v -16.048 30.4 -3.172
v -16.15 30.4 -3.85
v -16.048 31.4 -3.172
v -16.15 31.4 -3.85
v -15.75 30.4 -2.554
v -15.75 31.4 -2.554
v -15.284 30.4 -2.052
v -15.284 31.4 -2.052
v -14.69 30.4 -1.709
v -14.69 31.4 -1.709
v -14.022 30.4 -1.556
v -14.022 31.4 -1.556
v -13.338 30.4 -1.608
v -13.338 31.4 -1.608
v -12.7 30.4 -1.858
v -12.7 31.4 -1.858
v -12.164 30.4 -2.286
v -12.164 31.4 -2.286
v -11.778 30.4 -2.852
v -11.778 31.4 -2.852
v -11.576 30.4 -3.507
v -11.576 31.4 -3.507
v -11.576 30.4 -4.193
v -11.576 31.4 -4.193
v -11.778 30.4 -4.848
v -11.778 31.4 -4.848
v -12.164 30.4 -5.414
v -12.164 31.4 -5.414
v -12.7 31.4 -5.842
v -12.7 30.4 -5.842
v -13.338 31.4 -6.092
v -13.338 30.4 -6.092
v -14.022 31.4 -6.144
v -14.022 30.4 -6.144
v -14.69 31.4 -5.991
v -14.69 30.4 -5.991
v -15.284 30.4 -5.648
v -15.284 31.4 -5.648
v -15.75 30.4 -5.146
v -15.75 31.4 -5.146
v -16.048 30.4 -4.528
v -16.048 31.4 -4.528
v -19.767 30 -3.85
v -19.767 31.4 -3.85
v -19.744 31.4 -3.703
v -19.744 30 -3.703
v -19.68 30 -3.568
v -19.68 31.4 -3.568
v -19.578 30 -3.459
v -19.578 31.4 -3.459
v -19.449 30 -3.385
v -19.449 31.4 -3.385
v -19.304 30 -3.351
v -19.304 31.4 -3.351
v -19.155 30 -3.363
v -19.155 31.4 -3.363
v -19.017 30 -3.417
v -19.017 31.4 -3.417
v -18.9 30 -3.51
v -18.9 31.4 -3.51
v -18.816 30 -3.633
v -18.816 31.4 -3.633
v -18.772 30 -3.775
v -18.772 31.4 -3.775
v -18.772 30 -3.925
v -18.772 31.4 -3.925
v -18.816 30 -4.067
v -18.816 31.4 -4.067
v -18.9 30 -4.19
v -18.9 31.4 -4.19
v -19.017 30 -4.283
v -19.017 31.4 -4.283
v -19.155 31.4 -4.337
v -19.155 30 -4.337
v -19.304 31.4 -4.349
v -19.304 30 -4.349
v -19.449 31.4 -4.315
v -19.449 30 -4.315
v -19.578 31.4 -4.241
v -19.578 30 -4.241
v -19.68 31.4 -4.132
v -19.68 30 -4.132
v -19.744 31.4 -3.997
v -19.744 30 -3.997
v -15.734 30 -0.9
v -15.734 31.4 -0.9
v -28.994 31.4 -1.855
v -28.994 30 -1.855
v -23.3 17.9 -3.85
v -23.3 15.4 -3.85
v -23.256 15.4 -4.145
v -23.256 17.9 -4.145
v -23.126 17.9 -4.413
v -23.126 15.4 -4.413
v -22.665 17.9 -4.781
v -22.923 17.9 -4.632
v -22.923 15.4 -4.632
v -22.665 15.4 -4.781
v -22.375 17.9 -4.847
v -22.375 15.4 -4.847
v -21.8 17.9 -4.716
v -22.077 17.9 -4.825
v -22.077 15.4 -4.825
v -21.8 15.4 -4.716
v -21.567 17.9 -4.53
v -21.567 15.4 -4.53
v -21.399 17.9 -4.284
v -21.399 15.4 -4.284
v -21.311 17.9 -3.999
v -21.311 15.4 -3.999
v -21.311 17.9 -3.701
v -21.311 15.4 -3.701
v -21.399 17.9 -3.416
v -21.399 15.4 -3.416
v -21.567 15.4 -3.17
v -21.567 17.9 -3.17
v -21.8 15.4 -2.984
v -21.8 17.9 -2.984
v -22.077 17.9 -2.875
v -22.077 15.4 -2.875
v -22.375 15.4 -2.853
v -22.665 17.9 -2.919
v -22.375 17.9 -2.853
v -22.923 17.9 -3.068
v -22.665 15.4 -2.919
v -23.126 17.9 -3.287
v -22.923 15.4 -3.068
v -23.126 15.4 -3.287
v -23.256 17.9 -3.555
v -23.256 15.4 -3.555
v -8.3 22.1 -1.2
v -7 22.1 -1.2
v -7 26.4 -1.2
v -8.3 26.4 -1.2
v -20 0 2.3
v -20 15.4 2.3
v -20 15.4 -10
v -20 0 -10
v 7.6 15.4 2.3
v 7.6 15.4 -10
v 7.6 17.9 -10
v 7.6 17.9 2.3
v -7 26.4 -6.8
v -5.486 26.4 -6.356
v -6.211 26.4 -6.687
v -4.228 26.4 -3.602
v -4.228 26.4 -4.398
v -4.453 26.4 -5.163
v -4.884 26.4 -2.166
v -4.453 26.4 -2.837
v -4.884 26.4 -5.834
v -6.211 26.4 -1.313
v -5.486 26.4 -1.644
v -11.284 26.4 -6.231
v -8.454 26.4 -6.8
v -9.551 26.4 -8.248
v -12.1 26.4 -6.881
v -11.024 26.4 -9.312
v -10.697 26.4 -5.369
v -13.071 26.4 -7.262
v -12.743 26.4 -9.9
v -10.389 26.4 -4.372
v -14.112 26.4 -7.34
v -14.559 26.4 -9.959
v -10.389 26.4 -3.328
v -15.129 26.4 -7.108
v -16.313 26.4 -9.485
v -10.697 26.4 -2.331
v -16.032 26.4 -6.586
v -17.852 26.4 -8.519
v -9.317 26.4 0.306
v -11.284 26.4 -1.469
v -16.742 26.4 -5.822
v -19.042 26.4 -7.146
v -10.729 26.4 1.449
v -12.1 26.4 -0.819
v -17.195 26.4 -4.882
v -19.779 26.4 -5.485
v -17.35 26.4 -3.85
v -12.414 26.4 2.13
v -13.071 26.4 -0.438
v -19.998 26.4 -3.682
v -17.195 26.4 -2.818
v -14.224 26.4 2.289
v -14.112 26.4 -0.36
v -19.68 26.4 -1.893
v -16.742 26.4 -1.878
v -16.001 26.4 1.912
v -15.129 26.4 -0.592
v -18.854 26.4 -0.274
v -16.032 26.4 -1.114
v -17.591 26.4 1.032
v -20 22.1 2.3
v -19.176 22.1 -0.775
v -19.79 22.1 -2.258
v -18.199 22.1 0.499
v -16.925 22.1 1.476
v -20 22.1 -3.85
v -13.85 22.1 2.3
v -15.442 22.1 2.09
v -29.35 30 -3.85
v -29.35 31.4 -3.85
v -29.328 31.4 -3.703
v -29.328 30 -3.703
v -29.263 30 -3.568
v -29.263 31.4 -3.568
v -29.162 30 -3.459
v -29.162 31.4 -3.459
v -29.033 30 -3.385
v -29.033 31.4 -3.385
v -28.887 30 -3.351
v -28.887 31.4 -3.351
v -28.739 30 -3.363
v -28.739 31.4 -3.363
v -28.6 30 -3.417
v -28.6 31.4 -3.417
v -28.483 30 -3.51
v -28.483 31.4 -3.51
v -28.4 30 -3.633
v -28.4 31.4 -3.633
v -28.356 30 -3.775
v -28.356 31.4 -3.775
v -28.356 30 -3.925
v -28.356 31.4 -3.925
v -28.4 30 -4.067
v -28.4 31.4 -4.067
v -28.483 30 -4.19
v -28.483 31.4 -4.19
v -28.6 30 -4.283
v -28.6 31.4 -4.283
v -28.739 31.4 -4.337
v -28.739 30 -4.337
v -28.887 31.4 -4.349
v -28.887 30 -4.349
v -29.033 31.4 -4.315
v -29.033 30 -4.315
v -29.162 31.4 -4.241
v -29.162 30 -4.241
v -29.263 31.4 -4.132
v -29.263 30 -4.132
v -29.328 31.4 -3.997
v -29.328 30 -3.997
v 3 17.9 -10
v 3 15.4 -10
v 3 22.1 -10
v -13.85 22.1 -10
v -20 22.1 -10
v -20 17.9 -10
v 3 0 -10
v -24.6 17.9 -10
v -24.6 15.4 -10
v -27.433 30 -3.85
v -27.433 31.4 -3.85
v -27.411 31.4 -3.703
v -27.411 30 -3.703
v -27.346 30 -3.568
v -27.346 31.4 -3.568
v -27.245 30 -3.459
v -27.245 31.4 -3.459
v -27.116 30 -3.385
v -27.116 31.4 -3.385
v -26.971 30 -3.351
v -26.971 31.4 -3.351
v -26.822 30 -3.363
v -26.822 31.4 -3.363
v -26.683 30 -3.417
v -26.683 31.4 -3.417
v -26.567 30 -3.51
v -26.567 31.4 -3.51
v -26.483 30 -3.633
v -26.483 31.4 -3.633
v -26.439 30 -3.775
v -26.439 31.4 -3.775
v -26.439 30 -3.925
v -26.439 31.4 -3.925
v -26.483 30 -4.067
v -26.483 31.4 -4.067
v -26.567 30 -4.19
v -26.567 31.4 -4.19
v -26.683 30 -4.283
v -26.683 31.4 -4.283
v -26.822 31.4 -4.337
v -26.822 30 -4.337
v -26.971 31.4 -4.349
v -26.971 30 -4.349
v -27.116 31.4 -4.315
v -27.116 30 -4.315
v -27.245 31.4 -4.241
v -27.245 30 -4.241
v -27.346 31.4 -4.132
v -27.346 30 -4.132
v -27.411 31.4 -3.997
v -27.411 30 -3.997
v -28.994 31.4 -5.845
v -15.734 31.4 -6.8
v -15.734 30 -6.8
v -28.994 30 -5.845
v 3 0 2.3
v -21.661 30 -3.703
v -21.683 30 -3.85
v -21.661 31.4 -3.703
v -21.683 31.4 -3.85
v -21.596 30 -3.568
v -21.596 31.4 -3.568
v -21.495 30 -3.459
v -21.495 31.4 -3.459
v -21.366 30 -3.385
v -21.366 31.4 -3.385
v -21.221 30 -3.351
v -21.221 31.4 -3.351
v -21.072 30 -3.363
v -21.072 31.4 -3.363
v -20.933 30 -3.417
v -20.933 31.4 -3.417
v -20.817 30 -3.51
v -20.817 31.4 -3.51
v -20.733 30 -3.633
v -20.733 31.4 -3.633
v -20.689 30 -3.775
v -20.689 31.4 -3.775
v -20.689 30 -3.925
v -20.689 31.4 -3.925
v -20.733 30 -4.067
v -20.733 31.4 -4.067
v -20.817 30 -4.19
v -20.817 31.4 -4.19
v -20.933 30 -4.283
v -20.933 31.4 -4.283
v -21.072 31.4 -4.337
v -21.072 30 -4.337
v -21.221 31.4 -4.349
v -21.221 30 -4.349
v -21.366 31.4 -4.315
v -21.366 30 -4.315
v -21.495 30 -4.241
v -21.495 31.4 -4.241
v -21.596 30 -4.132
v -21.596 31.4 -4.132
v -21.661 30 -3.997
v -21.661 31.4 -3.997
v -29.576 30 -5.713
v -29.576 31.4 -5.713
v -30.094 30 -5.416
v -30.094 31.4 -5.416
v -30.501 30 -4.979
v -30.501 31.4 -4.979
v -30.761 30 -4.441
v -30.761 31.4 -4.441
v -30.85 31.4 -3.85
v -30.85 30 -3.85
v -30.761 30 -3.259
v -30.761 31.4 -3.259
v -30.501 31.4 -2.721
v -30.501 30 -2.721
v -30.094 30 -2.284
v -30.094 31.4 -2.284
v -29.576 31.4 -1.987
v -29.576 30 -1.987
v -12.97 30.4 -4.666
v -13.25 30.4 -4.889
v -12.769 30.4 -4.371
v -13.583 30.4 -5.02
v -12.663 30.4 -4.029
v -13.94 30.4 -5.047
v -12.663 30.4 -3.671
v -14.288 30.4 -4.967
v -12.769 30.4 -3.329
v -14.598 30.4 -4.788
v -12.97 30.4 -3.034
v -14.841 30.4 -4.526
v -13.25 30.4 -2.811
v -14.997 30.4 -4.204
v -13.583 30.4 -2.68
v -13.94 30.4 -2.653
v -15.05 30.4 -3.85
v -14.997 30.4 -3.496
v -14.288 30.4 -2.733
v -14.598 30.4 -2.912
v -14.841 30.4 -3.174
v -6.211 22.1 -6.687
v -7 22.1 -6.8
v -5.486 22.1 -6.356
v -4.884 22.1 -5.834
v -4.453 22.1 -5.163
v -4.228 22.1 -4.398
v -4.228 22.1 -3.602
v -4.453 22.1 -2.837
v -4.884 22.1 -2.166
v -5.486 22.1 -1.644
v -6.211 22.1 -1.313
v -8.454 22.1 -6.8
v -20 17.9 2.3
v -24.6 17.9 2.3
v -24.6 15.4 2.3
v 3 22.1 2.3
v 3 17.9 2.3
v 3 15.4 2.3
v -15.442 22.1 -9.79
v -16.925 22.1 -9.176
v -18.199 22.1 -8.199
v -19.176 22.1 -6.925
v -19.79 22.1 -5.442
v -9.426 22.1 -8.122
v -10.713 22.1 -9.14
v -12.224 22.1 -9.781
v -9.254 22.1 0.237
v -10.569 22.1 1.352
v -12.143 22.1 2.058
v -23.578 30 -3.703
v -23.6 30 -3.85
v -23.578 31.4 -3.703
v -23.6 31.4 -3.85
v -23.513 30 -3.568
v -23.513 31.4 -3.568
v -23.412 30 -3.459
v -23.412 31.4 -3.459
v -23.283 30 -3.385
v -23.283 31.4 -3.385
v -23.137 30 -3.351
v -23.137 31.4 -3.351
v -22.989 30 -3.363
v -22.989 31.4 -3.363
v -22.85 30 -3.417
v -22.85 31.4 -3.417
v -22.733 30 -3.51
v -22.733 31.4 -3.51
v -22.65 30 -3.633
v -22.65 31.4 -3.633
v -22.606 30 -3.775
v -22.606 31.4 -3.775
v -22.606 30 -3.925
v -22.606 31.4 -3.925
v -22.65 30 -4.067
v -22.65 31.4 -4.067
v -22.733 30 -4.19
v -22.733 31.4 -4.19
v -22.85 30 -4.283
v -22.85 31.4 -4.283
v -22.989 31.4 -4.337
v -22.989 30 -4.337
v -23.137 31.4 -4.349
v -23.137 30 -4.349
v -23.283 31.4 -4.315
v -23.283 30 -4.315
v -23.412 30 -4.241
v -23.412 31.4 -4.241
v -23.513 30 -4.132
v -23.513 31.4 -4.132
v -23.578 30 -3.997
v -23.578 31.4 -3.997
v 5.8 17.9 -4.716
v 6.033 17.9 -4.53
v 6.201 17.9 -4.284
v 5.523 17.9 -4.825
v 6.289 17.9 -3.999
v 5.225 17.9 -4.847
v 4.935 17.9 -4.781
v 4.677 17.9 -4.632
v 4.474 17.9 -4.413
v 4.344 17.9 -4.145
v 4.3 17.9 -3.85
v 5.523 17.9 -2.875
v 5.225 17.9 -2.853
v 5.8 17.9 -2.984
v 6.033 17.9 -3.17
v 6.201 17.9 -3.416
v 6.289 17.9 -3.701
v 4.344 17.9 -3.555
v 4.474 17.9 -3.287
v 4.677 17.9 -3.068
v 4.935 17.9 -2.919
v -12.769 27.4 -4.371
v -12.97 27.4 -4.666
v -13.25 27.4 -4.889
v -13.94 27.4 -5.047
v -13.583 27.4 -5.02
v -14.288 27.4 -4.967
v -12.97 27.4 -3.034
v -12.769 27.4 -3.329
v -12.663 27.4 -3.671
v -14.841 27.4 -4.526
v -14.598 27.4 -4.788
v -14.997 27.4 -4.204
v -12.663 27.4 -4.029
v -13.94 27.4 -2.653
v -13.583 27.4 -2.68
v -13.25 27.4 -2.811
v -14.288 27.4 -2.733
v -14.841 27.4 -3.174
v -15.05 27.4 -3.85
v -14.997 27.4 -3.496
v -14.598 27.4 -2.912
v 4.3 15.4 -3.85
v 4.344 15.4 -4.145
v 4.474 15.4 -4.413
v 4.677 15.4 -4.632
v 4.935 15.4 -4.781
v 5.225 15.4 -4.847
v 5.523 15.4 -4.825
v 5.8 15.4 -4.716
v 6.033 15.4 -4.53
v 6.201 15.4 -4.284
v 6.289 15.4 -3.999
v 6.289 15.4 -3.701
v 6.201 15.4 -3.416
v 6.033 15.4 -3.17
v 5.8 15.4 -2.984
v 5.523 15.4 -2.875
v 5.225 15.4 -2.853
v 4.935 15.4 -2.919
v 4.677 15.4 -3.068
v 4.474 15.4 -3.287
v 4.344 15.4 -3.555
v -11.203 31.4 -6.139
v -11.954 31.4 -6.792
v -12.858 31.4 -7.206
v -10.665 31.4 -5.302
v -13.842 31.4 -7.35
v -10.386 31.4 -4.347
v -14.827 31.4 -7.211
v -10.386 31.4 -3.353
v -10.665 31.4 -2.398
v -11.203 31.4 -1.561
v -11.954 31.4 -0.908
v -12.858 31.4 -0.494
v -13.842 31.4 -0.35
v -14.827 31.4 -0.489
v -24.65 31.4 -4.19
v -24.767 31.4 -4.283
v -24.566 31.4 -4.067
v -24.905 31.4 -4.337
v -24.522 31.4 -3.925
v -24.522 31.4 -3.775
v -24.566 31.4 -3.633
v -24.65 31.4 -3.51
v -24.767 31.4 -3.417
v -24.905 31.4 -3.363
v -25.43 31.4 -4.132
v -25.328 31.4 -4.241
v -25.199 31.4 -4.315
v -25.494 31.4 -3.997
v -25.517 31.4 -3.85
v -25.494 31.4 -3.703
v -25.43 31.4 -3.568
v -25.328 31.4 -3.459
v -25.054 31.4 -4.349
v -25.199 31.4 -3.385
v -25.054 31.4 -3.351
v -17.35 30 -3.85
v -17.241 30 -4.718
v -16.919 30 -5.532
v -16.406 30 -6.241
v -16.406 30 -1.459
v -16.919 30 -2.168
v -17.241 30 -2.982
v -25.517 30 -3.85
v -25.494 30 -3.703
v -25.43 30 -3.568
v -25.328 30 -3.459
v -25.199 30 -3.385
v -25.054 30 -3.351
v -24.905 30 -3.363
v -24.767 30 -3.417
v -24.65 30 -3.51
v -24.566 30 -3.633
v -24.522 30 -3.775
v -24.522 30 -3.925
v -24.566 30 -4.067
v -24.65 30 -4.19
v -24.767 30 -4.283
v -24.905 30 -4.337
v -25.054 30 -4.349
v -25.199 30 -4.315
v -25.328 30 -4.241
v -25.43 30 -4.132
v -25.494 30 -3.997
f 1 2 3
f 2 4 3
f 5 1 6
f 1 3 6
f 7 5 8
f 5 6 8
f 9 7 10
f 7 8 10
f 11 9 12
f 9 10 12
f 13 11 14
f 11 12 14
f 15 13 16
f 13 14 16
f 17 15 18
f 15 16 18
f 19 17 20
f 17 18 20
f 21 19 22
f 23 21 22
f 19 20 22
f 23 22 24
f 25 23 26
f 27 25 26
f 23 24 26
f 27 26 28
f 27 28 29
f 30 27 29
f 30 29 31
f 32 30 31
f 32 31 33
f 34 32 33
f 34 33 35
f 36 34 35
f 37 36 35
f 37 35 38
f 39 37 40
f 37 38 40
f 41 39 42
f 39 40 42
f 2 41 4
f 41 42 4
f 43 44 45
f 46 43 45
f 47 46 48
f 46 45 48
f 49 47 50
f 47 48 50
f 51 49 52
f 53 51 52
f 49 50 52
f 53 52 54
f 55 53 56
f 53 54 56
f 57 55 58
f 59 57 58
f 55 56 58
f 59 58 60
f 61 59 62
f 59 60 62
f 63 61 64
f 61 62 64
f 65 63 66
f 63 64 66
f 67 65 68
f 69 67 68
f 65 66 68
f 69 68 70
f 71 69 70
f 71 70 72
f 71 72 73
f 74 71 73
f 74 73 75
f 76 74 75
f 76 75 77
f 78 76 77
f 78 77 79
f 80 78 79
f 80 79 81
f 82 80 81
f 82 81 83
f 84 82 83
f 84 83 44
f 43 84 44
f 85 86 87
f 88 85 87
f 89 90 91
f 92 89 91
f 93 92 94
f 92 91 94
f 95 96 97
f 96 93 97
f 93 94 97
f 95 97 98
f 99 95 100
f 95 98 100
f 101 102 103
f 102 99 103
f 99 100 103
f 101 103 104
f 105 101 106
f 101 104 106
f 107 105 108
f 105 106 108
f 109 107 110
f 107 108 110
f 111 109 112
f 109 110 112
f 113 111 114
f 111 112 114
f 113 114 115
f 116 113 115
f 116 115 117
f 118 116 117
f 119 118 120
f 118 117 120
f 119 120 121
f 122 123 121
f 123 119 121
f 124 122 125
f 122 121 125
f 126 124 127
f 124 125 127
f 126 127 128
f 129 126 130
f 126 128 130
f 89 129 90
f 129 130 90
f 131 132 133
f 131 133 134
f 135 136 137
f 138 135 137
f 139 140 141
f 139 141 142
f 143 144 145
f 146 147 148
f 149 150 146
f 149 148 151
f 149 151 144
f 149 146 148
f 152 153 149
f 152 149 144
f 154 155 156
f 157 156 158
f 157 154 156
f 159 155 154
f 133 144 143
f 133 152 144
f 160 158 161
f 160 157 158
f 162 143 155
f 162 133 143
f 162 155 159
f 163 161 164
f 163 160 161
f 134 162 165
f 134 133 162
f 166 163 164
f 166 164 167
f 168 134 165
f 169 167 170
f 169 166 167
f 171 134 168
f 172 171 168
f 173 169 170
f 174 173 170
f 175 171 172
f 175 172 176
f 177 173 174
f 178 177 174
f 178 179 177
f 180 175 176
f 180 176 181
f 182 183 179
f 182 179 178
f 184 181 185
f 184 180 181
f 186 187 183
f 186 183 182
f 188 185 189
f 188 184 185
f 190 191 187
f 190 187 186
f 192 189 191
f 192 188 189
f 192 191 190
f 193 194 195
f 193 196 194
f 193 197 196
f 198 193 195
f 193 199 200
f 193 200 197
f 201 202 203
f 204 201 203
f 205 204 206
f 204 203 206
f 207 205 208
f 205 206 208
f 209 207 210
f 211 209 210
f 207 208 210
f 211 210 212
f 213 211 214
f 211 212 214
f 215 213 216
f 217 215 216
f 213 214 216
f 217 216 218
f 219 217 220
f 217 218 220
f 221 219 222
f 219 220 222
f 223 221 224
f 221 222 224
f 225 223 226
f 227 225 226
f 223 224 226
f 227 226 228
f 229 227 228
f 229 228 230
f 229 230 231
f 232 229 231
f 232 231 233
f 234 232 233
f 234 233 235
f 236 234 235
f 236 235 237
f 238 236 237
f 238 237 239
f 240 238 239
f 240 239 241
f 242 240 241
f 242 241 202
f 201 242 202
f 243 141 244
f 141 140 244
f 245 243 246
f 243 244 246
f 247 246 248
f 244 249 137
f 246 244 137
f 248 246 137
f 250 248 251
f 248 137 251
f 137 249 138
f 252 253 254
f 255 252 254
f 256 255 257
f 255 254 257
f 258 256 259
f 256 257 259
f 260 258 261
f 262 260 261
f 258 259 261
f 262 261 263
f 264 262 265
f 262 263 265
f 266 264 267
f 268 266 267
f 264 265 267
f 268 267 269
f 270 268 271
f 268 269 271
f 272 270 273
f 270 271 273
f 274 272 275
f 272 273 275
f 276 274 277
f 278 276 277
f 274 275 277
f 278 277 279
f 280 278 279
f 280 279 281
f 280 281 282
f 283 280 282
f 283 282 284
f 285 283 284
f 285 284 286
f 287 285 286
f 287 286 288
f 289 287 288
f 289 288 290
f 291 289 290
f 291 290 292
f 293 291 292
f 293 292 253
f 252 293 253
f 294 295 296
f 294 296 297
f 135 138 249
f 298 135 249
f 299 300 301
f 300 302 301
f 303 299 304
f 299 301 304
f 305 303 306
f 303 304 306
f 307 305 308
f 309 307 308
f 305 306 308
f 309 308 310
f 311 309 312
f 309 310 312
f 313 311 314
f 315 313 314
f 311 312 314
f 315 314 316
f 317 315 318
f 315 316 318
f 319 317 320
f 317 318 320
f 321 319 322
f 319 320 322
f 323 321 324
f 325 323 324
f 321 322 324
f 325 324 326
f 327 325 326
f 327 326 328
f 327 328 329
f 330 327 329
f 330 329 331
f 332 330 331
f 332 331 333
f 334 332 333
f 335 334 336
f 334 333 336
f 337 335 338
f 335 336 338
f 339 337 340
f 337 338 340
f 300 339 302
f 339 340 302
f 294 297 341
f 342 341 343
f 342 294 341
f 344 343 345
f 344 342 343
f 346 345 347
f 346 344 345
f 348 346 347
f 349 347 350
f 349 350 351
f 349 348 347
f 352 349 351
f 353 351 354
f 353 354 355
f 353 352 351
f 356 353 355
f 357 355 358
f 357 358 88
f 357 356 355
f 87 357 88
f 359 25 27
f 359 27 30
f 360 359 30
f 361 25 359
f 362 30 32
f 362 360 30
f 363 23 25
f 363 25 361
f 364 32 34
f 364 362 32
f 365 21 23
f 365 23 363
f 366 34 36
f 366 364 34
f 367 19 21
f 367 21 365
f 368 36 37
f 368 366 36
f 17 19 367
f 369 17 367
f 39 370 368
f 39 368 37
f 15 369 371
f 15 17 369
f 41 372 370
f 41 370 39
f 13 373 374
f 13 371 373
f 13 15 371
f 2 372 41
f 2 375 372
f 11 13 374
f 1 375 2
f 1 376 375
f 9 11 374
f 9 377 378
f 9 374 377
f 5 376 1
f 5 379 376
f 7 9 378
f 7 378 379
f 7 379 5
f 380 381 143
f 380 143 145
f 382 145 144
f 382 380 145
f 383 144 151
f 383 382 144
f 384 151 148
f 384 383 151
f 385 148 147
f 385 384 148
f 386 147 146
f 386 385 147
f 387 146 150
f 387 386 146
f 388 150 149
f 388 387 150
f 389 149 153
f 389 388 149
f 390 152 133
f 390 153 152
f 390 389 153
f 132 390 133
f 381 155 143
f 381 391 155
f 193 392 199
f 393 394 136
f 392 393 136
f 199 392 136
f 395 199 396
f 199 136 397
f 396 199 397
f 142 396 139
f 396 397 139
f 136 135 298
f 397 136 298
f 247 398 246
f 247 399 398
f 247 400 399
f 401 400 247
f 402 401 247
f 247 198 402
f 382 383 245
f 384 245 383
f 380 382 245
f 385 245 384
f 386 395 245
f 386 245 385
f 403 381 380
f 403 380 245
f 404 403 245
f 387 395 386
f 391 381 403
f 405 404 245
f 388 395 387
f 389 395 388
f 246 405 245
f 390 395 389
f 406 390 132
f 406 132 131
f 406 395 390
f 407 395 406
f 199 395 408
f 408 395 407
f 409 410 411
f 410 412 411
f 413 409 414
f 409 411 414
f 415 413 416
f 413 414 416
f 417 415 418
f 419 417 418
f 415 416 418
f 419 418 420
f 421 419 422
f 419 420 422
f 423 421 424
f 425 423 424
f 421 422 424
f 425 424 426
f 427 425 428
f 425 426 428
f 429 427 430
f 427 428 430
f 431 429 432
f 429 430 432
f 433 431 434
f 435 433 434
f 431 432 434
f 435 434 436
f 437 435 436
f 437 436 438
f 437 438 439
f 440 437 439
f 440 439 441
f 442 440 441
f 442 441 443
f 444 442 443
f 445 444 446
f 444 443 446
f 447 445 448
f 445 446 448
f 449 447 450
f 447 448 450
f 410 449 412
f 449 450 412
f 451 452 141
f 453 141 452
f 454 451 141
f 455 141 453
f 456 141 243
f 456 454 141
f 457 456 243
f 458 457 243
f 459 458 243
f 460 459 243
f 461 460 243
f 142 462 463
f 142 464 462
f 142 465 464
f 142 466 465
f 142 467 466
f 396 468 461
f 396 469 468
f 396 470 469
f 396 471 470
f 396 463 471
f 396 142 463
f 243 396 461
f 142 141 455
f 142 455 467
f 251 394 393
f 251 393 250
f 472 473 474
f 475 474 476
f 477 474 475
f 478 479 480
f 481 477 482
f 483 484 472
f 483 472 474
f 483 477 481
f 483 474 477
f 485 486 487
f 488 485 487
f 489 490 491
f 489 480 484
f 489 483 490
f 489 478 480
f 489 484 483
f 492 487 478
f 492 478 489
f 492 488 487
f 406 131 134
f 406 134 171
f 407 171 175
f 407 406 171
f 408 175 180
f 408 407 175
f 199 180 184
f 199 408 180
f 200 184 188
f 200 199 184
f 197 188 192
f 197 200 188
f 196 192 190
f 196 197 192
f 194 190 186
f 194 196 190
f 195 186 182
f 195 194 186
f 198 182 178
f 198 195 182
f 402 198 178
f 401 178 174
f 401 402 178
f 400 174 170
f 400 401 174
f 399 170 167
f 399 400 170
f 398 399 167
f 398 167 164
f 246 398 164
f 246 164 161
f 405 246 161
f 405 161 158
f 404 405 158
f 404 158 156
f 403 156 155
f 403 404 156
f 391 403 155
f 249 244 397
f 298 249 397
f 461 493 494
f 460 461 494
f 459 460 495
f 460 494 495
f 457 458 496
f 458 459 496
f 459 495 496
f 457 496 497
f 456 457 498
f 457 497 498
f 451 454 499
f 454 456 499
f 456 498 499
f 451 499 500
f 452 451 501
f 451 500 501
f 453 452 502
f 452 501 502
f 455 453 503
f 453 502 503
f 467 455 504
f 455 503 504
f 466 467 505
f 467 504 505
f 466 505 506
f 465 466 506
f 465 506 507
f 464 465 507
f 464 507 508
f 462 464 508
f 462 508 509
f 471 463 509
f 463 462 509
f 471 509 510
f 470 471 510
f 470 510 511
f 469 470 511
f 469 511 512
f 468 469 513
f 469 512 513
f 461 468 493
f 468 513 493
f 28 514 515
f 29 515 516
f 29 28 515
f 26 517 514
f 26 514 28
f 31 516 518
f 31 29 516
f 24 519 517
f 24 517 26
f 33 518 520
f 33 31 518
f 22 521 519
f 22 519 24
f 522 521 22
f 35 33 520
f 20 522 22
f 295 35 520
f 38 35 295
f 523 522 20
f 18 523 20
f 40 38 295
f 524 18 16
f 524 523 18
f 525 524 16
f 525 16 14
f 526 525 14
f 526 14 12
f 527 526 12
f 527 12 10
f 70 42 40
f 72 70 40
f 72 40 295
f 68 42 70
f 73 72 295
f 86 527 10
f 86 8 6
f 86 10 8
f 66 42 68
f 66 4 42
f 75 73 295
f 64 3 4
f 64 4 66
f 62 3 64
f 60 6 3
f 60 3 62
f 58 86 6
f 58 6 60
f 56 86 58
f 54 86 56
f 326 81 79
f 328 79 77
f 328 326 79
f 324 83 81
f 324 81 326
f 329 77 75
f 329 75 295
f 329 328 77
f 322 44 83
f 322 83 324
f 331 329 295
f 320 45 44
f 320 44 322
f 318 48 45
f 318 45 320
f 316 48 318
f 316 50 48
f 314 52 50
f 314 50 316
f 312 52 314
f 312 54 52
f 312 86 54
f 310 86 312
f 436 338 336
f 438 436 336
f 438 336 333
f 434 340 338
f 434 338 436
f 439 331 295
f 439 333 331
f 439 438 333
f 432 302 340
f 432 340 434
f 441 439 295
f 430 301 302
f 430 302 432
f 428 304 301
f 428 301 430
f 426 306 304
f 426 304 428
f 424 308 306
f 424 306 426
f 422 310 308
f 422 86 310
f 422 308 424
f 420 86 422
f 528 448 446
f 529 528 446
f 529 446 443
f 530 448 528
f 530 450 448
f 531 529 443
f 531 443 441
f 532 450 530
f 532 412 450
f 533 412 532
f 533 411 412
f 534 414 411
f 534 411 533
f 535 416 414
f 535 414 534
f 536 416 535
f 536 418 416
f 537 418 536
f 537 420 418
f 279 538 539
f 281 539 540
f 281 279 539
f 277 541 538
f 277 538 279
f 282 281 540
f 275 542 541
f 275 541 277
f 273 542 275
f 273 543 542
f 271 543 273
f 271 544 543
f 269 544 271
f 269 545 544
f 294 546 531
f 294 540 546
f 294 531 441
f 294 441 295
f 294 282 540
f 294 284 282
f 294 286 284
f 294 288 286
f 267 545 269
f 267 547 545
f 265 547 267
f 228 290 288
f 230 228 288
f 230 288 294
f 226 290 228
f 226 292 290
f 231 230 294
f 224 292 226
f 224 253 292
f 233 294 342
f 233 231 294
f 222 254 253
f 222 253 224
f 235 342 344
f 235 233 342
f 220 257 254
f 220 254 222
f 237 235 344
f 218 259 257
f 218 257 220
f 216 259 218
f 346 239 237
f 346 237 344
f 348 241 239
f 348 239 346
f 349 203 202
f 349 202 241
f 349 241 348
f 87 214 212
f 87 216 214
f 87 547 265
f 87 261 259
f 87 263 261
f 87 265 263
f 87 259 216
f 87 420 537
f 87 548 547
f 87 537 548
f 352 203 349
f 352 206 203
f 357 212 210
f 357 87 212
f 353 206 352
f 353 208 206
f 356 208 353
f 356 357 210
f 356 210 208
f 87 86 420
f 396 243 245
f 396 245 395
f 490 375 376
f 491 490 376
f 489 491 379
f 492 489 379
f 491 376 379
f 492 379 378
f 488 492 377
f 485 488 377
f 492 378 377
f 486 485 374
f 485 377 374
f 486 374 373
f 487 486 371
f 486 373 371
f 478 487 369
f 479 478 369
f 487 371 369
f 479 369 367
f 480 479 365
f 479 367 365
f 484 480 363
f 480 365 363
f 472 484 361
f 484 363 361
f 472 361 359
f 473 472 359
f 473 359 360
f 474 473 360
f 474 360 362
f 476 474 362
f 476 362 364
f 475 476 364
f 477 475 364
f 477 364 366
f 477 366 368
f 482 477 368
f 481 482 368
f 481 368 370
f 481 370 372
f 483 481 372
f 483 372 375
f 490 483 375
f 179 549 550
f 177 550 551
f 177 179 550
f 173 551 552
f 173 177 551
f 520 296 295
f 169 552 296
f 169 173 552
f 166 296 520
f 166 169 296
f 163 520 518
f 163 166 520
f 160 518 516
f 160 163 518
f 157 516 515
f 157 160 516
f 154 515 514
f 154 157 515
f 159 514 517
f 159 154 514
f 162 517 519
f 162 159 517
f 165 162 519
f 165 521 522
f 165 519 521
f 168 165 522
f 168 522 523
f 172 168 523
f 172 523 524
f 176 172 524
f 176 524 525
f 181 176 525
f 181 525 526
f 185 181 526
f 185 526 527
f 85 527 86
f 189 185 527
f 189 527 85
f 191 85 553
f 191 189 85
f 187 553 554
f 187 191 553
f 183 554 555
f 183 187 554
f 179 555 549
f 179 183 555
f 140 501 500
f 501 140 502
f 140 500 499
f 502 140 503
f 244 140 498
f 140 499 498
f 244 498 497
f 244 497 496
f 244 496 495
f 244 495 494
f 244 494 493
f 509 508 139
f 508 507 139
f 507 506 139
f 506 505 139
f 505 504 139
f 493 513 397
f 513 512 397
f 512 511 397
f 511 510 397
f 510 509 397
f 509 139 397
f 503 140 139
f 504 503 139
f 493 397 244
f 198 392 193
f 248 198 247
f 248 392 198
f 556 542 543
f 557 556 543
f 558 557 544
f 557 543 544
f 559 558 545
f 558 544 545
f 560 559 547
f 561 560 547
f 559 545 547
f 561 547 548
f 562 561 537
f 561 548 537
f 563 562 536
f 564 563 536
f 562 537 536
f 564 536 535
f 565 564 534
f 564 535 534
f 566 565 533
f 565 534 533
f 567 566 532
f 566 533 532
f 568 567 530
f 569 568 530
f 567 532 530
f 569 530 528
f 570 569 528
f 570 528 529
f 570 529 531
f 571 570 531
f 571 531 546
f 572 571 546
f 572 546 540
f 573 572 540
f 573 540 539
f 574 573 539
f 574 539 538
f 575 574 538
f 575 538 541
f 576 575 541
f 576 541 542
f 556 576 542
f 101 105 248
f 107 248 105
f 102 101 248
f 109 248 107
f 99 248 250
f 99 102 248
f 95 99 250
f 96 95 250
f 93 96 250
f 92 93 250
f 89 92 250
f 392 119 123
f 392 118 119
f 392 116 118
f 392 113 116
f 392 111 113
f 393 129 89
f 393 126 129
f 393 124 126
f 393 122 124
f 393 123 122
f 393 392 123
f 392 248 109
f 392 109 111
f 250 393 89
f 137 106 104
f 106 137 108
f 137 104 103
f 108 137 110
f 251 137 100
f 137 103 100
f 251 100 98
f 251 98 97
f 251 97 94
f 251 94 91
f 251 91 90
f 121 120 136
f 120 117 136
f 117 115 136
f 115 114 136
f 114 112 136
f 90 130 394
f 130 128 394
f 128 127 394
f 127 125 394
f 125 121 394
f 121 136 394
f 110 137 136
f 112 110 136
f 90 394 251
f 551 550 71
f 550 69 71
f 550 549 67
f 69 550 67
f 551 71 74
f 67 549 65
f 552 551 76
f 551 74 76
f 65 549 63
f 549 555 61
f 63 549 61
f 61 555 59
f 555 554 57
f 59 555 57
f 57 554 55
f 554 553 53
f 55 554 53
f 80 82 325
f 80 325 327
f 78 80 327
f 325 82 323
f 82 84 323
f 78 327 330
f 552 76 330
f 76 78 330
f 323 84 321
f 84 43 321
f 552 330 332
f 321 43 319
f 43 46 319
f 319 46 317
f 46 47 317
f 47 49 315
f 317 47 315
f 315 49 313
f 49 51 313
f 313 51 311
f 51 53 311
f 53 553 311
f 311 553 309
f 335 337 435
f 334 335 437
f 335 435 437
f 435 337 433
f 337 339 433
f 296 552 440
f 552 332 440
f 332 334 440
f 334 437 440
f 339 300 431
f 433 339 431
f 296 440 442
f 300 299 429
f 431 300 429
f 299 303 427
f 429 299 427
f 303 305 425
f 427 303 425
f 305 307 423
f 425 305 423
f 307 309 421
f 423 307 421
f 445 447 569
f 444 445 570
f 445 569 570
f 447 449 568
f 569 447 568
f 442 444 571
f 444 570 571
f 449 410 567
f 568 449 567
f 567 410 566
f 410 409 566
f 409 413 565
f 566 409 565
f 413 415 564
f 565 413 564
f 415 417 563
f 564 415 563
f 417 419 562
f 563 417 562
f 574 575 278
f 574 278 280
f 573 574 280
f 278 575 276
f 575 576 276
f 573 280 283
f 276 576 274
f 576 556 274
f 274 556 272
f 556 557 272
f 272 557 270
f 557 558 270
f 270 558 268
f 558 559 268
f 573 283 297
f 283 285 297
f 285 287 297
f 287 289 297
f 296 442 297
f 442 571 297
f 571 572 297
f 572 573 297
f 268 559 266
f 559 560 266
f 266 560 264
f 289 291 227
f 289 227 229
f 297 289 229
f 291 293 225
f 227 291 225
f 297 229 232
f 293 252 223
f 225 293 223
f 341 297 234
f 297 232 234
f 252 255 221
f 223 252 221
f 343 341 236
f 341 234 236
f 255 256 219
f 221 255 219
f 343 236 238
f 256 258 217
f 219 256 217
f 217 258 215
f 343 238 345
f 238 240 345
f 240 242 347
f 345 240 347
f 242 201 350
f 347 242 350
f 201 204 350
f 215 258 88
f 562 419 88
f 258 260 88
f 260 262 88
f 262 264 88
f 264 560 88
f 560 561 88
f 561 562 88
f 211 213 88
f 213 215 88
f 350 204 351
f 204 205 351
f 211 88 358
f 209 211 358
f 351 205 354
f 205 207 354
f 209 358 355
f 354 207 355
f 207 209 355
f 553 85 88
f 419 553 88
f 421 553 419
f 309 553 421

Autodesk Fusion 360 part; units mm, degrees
sketch "Sketch1" plane through (0, 0, 0) normal (0, 1, 0) x (1, 0, 0)
  line L0 (-20, 10) -> (3, 10)
  line L1 (3, 10) -> (3, -2.3)
  line L2 (3, -2.3) -> (-20, -2.3)
  line L3 (-20, -2.3) -> (-20, 10)
  dimension "d1" = 23
  dimension "d2" = 12.3
extrude "Extrude1" add sketch "Sketch1" along normal blind 15.4 makes body 1
sketch "Sketch2" plane through (0, 15.4, 0) normal (0, 1, 0) x (-1, 0, 0)
  line L0 (20, 2.3) -> (-3, 2.3)
  line L1 (-3, 2.3) -> (-3, -10)
  line L2 (-3, -10) -> (20, -10)
  line L3 (20, -10) -> (20, 2.3)
  line L4 (24.6, -10) -> (-7.6, -10)
  line L5 (-7.6, -10) -> (-7.6, 2.3)
  line L6 (-7.6, 2.3) -> (24.6, 2.3)
  line L7 (24.6, 2.3) -> (24.6, -10)
  line L8 (24.6, -10) -> (-7.6, 2.3) construction
  line L9 (-7.6, -10) -> (24.6, 2.3) construction
  line L10 (20, -3.85) -> (24.6, -3.85) construction
  line L11 (-3, -3.85) -> (-7.6, -3.85) construction
  circle A0 centre (-5.3, -3.85) radius 1
  circle A1 centre (22.3, -3.85) radius 1
  point P0 (8.5, -3.85)
  dimension "d5" = 32.2
  dimension "d6" = 2
  dimension "d7" = 2
extrude "Extrude2" add sketch "Sketch2" along normal blind 2.5 bodies 1
sketch "Sketch3" plane through (0, 17.9, 0) normal (0, 1, 0) x (-1, 0, 0)
  circle A0 centre (-5.3, -3.85) radius 1
  circle A1 centre (22.3, -3.85) radius 1
  line L0 (24.6, 2.3) -> (-7.6, 2.3)
  line L1 (-7.6, 2.3) -> (-7.6, -10)
  line L2 (-7.6, -10) -> (24.6, -10)
  line L3 (24.6, -10) -> (24.6, 2.3)
  line L4 (-3, 2.3) -> (20, 2.3)
  line L5 (20, 2.3) -> (20, -10)
  line L6 (20, -10) -> (-3, -10)
  line L7 (-3, -10) -> (-3, 2.3)
extrude "Extrude3" add sketch "Sketch3" along normal blind 4.2 contours L0 L2 L4 L5 L6 L7 bodies 1
sketch "Sketch4" plane through (0, 22.1, 0) normal (0, 1, 0) x (-1, 0, 0)
  line L0 (-3, -10) -> (20, -10)
  line L1 (20, -10) -> (20, 2.3)
  line L2 (20, 2.3) -> (-3, 2.3)
  line L3 (-3, 2.3) -> (-3, -10)
  circle A0 centre (13.85, -3.85) radius 6.15
  circle A1 centre (7, -4) radius 2.8
  line L4 (12.5, -6.8) -> (1.5, -6.8)
  line L5 (1.5, -6.8) -> (1.5, -1.2)
  line L6 (1.5, -1.2) -> (12.5, -1.2)
  line L7 (12.5, -1.2) -> (12.5, -6.8)
  line L8 (12.5, -6.8) -> (1.5, -1.2) construction
  line L9 (1.5, -6.8) -> (12.5, -1.2) construction
  point P0 (7, -4)
  dimension "d12" = 5.6
  dimension "d13" = 5.6
extrude "Extrude4" add sketch "Sketch4" along normal blind 4.3 contours A0 L4 L6 L7 | A0 A1 L4 | A0 A1 L4 L6 L7 | A0 A1 | A0 A1 | A0 A1 L6 bodies 1
sketch "Sketch5" plane through (0, 26.4, 0) normal (0, 1, 0) x (-1, 0, 0)
  arc A0 (7, -1.2) -> (7, -6.8) centre (7, -4) ccw
  line L0 (7, -6.8) -> (8.4537, -6.8)
  arc A1 (8.4537, -6.8) -> (8.3002, -1.2) centre (13.85, -3.85) ccw
  line L1 (8.3002, -1.2) -> (7, -1.2)
  circle A2 centre (13.85, -3.85) radius 3.5
  dimension "d16" = 7
extrude "Extrude5" add sketch "Sketch5" along normal blind 5 contours A2 bodies 1
sketch "Sketch6" plane through (0, 31.4, 0) normal (0, 1, 0) x (-1, 0, 0)
  circle A0 centre (13.85, -3.85) radius 3.5
  line L0 (13.85, -3.85) -> (28.85, -3.85)
  circle A1 centre (28.85, -3.85) radius 2
  line L1 (15.7335, -6.8) -> (15.7335, -0.9)
  line L2 (15.7335, -6.8) -> (28.9937, -5.8448)
  line L3 (15.7335, -0.9) -> (28.9937, -1.8552)
  dimension "d19" = 15
  dimension "d20" = 4
  dimension "d21" = 5.9
extrude "Extrude6" add sketch "Sketch6" against normal blind 1.4 contours A0 L0 A1 L2 | A0 L0 A1 L3 | A1 bodies 1
sketch "Sketch7" plane through (0, 31.4, 0) normal (0, 1, 0) x (-1, 0, 0)
  arc A0 (15.7335, -0.9) -> (15.7335, -6.8) centre (13.85, -3.85) ccw
  line L0 (15.7335, -6.8) -> (28.9937, -5.8448)
  arc A1 (28.9937, -5.8448) -> (28.9937, -1.8552) centre (28.85, -3.85) ccw
  line L1 (28.9937, -1.8552) -> (15.7335, -0.9)
  circle A2 centre (13.85, -3.85) radius 3.5 construction
  circle A3 centre (28.85, -3.85) radius 0.5
  line L2 (17.35, -3.85) -> (28.85, -3.85) construction
  circle A4 centre (26.9333, -3.85) radius 0.5
  circle A5 centre (25.0167, -3.85) radius 0.5
  circle A6 centre (23.1, -3.85) radius 0.5
  circle A7 centre (21.1833, -3.85) radius 0.5
  circle A8 centre (19.2667, -3.85) radius 0.5
  circle A9 centre (17.35, -3.85) radius 0.5
  dimension "d24" = 1
  dimension "d27" = -11.5
  dimension "d28" = 0
extrude "Extrude7" cut sketch "Sketch7" against normal up to surface (1.4 mm away) contours A3 | A4 | A5 | A6 | A7 | A8 bodies 1
sketch "Sketch8" plane through (0, 31.4, 0) normal (0, 1, 0) x (-1, 0, 0)
  circle A0 centre (25.0167, -3.85) radius 0.5
  circle A1 centre (19.2667, -3.85) radius 0.5
  circle A2 centre (26.9333, -3.85) radius 0.5
  circle A3 centre (23.1, -3.85) radius 0.5
  circle A4 centre (21.1833, -3.85) radius 0.5
  circle A5 centre (28.85, -3.85) radius 0.5
  arc A6 (15.7335, -0.9) -> (15.7335, -6.8) centre (13.85, -3.85) ccw
  line L0 (15.7335, -6.8) -> (28.9937, -5.8448)
  arc A7 (28.9937, -5.8448) -> (28.9937, -1.8552) centre (28.85, -3.85) ccw
  line L1 (28.9937, -1.8552) -> (15.7335, -0.9)
  circle A8 centre (13.85, -3.85) radius 2.3
  dimension "d31" = 4.6
extrude "Extrude8" cut sketch "Sketch8" against normal blind 1 contours A8 bodies 1
sketch "Sketch9" plane through (0, 30.4, 0) normal (0, 1, 0) x (-1, 0, 0)
  circle A0 centre (13.85, -3.85) radius 2.3
  circle A1 centre (13.85, -3.85) radius 1.2
  dimension "d34" = 2.4
extrude "Extrude9" cut sketch "Sketch9" against normal blind 3 contours A1 bodies 1
copy_body "Body->Comp1" bodies 1 removing the originals makes body 2 in component "Servo"
component "Servo" placed x (1, 0, 0) y (0, 1, 0) z (0, 0, 1) at (0, 0, 0)
